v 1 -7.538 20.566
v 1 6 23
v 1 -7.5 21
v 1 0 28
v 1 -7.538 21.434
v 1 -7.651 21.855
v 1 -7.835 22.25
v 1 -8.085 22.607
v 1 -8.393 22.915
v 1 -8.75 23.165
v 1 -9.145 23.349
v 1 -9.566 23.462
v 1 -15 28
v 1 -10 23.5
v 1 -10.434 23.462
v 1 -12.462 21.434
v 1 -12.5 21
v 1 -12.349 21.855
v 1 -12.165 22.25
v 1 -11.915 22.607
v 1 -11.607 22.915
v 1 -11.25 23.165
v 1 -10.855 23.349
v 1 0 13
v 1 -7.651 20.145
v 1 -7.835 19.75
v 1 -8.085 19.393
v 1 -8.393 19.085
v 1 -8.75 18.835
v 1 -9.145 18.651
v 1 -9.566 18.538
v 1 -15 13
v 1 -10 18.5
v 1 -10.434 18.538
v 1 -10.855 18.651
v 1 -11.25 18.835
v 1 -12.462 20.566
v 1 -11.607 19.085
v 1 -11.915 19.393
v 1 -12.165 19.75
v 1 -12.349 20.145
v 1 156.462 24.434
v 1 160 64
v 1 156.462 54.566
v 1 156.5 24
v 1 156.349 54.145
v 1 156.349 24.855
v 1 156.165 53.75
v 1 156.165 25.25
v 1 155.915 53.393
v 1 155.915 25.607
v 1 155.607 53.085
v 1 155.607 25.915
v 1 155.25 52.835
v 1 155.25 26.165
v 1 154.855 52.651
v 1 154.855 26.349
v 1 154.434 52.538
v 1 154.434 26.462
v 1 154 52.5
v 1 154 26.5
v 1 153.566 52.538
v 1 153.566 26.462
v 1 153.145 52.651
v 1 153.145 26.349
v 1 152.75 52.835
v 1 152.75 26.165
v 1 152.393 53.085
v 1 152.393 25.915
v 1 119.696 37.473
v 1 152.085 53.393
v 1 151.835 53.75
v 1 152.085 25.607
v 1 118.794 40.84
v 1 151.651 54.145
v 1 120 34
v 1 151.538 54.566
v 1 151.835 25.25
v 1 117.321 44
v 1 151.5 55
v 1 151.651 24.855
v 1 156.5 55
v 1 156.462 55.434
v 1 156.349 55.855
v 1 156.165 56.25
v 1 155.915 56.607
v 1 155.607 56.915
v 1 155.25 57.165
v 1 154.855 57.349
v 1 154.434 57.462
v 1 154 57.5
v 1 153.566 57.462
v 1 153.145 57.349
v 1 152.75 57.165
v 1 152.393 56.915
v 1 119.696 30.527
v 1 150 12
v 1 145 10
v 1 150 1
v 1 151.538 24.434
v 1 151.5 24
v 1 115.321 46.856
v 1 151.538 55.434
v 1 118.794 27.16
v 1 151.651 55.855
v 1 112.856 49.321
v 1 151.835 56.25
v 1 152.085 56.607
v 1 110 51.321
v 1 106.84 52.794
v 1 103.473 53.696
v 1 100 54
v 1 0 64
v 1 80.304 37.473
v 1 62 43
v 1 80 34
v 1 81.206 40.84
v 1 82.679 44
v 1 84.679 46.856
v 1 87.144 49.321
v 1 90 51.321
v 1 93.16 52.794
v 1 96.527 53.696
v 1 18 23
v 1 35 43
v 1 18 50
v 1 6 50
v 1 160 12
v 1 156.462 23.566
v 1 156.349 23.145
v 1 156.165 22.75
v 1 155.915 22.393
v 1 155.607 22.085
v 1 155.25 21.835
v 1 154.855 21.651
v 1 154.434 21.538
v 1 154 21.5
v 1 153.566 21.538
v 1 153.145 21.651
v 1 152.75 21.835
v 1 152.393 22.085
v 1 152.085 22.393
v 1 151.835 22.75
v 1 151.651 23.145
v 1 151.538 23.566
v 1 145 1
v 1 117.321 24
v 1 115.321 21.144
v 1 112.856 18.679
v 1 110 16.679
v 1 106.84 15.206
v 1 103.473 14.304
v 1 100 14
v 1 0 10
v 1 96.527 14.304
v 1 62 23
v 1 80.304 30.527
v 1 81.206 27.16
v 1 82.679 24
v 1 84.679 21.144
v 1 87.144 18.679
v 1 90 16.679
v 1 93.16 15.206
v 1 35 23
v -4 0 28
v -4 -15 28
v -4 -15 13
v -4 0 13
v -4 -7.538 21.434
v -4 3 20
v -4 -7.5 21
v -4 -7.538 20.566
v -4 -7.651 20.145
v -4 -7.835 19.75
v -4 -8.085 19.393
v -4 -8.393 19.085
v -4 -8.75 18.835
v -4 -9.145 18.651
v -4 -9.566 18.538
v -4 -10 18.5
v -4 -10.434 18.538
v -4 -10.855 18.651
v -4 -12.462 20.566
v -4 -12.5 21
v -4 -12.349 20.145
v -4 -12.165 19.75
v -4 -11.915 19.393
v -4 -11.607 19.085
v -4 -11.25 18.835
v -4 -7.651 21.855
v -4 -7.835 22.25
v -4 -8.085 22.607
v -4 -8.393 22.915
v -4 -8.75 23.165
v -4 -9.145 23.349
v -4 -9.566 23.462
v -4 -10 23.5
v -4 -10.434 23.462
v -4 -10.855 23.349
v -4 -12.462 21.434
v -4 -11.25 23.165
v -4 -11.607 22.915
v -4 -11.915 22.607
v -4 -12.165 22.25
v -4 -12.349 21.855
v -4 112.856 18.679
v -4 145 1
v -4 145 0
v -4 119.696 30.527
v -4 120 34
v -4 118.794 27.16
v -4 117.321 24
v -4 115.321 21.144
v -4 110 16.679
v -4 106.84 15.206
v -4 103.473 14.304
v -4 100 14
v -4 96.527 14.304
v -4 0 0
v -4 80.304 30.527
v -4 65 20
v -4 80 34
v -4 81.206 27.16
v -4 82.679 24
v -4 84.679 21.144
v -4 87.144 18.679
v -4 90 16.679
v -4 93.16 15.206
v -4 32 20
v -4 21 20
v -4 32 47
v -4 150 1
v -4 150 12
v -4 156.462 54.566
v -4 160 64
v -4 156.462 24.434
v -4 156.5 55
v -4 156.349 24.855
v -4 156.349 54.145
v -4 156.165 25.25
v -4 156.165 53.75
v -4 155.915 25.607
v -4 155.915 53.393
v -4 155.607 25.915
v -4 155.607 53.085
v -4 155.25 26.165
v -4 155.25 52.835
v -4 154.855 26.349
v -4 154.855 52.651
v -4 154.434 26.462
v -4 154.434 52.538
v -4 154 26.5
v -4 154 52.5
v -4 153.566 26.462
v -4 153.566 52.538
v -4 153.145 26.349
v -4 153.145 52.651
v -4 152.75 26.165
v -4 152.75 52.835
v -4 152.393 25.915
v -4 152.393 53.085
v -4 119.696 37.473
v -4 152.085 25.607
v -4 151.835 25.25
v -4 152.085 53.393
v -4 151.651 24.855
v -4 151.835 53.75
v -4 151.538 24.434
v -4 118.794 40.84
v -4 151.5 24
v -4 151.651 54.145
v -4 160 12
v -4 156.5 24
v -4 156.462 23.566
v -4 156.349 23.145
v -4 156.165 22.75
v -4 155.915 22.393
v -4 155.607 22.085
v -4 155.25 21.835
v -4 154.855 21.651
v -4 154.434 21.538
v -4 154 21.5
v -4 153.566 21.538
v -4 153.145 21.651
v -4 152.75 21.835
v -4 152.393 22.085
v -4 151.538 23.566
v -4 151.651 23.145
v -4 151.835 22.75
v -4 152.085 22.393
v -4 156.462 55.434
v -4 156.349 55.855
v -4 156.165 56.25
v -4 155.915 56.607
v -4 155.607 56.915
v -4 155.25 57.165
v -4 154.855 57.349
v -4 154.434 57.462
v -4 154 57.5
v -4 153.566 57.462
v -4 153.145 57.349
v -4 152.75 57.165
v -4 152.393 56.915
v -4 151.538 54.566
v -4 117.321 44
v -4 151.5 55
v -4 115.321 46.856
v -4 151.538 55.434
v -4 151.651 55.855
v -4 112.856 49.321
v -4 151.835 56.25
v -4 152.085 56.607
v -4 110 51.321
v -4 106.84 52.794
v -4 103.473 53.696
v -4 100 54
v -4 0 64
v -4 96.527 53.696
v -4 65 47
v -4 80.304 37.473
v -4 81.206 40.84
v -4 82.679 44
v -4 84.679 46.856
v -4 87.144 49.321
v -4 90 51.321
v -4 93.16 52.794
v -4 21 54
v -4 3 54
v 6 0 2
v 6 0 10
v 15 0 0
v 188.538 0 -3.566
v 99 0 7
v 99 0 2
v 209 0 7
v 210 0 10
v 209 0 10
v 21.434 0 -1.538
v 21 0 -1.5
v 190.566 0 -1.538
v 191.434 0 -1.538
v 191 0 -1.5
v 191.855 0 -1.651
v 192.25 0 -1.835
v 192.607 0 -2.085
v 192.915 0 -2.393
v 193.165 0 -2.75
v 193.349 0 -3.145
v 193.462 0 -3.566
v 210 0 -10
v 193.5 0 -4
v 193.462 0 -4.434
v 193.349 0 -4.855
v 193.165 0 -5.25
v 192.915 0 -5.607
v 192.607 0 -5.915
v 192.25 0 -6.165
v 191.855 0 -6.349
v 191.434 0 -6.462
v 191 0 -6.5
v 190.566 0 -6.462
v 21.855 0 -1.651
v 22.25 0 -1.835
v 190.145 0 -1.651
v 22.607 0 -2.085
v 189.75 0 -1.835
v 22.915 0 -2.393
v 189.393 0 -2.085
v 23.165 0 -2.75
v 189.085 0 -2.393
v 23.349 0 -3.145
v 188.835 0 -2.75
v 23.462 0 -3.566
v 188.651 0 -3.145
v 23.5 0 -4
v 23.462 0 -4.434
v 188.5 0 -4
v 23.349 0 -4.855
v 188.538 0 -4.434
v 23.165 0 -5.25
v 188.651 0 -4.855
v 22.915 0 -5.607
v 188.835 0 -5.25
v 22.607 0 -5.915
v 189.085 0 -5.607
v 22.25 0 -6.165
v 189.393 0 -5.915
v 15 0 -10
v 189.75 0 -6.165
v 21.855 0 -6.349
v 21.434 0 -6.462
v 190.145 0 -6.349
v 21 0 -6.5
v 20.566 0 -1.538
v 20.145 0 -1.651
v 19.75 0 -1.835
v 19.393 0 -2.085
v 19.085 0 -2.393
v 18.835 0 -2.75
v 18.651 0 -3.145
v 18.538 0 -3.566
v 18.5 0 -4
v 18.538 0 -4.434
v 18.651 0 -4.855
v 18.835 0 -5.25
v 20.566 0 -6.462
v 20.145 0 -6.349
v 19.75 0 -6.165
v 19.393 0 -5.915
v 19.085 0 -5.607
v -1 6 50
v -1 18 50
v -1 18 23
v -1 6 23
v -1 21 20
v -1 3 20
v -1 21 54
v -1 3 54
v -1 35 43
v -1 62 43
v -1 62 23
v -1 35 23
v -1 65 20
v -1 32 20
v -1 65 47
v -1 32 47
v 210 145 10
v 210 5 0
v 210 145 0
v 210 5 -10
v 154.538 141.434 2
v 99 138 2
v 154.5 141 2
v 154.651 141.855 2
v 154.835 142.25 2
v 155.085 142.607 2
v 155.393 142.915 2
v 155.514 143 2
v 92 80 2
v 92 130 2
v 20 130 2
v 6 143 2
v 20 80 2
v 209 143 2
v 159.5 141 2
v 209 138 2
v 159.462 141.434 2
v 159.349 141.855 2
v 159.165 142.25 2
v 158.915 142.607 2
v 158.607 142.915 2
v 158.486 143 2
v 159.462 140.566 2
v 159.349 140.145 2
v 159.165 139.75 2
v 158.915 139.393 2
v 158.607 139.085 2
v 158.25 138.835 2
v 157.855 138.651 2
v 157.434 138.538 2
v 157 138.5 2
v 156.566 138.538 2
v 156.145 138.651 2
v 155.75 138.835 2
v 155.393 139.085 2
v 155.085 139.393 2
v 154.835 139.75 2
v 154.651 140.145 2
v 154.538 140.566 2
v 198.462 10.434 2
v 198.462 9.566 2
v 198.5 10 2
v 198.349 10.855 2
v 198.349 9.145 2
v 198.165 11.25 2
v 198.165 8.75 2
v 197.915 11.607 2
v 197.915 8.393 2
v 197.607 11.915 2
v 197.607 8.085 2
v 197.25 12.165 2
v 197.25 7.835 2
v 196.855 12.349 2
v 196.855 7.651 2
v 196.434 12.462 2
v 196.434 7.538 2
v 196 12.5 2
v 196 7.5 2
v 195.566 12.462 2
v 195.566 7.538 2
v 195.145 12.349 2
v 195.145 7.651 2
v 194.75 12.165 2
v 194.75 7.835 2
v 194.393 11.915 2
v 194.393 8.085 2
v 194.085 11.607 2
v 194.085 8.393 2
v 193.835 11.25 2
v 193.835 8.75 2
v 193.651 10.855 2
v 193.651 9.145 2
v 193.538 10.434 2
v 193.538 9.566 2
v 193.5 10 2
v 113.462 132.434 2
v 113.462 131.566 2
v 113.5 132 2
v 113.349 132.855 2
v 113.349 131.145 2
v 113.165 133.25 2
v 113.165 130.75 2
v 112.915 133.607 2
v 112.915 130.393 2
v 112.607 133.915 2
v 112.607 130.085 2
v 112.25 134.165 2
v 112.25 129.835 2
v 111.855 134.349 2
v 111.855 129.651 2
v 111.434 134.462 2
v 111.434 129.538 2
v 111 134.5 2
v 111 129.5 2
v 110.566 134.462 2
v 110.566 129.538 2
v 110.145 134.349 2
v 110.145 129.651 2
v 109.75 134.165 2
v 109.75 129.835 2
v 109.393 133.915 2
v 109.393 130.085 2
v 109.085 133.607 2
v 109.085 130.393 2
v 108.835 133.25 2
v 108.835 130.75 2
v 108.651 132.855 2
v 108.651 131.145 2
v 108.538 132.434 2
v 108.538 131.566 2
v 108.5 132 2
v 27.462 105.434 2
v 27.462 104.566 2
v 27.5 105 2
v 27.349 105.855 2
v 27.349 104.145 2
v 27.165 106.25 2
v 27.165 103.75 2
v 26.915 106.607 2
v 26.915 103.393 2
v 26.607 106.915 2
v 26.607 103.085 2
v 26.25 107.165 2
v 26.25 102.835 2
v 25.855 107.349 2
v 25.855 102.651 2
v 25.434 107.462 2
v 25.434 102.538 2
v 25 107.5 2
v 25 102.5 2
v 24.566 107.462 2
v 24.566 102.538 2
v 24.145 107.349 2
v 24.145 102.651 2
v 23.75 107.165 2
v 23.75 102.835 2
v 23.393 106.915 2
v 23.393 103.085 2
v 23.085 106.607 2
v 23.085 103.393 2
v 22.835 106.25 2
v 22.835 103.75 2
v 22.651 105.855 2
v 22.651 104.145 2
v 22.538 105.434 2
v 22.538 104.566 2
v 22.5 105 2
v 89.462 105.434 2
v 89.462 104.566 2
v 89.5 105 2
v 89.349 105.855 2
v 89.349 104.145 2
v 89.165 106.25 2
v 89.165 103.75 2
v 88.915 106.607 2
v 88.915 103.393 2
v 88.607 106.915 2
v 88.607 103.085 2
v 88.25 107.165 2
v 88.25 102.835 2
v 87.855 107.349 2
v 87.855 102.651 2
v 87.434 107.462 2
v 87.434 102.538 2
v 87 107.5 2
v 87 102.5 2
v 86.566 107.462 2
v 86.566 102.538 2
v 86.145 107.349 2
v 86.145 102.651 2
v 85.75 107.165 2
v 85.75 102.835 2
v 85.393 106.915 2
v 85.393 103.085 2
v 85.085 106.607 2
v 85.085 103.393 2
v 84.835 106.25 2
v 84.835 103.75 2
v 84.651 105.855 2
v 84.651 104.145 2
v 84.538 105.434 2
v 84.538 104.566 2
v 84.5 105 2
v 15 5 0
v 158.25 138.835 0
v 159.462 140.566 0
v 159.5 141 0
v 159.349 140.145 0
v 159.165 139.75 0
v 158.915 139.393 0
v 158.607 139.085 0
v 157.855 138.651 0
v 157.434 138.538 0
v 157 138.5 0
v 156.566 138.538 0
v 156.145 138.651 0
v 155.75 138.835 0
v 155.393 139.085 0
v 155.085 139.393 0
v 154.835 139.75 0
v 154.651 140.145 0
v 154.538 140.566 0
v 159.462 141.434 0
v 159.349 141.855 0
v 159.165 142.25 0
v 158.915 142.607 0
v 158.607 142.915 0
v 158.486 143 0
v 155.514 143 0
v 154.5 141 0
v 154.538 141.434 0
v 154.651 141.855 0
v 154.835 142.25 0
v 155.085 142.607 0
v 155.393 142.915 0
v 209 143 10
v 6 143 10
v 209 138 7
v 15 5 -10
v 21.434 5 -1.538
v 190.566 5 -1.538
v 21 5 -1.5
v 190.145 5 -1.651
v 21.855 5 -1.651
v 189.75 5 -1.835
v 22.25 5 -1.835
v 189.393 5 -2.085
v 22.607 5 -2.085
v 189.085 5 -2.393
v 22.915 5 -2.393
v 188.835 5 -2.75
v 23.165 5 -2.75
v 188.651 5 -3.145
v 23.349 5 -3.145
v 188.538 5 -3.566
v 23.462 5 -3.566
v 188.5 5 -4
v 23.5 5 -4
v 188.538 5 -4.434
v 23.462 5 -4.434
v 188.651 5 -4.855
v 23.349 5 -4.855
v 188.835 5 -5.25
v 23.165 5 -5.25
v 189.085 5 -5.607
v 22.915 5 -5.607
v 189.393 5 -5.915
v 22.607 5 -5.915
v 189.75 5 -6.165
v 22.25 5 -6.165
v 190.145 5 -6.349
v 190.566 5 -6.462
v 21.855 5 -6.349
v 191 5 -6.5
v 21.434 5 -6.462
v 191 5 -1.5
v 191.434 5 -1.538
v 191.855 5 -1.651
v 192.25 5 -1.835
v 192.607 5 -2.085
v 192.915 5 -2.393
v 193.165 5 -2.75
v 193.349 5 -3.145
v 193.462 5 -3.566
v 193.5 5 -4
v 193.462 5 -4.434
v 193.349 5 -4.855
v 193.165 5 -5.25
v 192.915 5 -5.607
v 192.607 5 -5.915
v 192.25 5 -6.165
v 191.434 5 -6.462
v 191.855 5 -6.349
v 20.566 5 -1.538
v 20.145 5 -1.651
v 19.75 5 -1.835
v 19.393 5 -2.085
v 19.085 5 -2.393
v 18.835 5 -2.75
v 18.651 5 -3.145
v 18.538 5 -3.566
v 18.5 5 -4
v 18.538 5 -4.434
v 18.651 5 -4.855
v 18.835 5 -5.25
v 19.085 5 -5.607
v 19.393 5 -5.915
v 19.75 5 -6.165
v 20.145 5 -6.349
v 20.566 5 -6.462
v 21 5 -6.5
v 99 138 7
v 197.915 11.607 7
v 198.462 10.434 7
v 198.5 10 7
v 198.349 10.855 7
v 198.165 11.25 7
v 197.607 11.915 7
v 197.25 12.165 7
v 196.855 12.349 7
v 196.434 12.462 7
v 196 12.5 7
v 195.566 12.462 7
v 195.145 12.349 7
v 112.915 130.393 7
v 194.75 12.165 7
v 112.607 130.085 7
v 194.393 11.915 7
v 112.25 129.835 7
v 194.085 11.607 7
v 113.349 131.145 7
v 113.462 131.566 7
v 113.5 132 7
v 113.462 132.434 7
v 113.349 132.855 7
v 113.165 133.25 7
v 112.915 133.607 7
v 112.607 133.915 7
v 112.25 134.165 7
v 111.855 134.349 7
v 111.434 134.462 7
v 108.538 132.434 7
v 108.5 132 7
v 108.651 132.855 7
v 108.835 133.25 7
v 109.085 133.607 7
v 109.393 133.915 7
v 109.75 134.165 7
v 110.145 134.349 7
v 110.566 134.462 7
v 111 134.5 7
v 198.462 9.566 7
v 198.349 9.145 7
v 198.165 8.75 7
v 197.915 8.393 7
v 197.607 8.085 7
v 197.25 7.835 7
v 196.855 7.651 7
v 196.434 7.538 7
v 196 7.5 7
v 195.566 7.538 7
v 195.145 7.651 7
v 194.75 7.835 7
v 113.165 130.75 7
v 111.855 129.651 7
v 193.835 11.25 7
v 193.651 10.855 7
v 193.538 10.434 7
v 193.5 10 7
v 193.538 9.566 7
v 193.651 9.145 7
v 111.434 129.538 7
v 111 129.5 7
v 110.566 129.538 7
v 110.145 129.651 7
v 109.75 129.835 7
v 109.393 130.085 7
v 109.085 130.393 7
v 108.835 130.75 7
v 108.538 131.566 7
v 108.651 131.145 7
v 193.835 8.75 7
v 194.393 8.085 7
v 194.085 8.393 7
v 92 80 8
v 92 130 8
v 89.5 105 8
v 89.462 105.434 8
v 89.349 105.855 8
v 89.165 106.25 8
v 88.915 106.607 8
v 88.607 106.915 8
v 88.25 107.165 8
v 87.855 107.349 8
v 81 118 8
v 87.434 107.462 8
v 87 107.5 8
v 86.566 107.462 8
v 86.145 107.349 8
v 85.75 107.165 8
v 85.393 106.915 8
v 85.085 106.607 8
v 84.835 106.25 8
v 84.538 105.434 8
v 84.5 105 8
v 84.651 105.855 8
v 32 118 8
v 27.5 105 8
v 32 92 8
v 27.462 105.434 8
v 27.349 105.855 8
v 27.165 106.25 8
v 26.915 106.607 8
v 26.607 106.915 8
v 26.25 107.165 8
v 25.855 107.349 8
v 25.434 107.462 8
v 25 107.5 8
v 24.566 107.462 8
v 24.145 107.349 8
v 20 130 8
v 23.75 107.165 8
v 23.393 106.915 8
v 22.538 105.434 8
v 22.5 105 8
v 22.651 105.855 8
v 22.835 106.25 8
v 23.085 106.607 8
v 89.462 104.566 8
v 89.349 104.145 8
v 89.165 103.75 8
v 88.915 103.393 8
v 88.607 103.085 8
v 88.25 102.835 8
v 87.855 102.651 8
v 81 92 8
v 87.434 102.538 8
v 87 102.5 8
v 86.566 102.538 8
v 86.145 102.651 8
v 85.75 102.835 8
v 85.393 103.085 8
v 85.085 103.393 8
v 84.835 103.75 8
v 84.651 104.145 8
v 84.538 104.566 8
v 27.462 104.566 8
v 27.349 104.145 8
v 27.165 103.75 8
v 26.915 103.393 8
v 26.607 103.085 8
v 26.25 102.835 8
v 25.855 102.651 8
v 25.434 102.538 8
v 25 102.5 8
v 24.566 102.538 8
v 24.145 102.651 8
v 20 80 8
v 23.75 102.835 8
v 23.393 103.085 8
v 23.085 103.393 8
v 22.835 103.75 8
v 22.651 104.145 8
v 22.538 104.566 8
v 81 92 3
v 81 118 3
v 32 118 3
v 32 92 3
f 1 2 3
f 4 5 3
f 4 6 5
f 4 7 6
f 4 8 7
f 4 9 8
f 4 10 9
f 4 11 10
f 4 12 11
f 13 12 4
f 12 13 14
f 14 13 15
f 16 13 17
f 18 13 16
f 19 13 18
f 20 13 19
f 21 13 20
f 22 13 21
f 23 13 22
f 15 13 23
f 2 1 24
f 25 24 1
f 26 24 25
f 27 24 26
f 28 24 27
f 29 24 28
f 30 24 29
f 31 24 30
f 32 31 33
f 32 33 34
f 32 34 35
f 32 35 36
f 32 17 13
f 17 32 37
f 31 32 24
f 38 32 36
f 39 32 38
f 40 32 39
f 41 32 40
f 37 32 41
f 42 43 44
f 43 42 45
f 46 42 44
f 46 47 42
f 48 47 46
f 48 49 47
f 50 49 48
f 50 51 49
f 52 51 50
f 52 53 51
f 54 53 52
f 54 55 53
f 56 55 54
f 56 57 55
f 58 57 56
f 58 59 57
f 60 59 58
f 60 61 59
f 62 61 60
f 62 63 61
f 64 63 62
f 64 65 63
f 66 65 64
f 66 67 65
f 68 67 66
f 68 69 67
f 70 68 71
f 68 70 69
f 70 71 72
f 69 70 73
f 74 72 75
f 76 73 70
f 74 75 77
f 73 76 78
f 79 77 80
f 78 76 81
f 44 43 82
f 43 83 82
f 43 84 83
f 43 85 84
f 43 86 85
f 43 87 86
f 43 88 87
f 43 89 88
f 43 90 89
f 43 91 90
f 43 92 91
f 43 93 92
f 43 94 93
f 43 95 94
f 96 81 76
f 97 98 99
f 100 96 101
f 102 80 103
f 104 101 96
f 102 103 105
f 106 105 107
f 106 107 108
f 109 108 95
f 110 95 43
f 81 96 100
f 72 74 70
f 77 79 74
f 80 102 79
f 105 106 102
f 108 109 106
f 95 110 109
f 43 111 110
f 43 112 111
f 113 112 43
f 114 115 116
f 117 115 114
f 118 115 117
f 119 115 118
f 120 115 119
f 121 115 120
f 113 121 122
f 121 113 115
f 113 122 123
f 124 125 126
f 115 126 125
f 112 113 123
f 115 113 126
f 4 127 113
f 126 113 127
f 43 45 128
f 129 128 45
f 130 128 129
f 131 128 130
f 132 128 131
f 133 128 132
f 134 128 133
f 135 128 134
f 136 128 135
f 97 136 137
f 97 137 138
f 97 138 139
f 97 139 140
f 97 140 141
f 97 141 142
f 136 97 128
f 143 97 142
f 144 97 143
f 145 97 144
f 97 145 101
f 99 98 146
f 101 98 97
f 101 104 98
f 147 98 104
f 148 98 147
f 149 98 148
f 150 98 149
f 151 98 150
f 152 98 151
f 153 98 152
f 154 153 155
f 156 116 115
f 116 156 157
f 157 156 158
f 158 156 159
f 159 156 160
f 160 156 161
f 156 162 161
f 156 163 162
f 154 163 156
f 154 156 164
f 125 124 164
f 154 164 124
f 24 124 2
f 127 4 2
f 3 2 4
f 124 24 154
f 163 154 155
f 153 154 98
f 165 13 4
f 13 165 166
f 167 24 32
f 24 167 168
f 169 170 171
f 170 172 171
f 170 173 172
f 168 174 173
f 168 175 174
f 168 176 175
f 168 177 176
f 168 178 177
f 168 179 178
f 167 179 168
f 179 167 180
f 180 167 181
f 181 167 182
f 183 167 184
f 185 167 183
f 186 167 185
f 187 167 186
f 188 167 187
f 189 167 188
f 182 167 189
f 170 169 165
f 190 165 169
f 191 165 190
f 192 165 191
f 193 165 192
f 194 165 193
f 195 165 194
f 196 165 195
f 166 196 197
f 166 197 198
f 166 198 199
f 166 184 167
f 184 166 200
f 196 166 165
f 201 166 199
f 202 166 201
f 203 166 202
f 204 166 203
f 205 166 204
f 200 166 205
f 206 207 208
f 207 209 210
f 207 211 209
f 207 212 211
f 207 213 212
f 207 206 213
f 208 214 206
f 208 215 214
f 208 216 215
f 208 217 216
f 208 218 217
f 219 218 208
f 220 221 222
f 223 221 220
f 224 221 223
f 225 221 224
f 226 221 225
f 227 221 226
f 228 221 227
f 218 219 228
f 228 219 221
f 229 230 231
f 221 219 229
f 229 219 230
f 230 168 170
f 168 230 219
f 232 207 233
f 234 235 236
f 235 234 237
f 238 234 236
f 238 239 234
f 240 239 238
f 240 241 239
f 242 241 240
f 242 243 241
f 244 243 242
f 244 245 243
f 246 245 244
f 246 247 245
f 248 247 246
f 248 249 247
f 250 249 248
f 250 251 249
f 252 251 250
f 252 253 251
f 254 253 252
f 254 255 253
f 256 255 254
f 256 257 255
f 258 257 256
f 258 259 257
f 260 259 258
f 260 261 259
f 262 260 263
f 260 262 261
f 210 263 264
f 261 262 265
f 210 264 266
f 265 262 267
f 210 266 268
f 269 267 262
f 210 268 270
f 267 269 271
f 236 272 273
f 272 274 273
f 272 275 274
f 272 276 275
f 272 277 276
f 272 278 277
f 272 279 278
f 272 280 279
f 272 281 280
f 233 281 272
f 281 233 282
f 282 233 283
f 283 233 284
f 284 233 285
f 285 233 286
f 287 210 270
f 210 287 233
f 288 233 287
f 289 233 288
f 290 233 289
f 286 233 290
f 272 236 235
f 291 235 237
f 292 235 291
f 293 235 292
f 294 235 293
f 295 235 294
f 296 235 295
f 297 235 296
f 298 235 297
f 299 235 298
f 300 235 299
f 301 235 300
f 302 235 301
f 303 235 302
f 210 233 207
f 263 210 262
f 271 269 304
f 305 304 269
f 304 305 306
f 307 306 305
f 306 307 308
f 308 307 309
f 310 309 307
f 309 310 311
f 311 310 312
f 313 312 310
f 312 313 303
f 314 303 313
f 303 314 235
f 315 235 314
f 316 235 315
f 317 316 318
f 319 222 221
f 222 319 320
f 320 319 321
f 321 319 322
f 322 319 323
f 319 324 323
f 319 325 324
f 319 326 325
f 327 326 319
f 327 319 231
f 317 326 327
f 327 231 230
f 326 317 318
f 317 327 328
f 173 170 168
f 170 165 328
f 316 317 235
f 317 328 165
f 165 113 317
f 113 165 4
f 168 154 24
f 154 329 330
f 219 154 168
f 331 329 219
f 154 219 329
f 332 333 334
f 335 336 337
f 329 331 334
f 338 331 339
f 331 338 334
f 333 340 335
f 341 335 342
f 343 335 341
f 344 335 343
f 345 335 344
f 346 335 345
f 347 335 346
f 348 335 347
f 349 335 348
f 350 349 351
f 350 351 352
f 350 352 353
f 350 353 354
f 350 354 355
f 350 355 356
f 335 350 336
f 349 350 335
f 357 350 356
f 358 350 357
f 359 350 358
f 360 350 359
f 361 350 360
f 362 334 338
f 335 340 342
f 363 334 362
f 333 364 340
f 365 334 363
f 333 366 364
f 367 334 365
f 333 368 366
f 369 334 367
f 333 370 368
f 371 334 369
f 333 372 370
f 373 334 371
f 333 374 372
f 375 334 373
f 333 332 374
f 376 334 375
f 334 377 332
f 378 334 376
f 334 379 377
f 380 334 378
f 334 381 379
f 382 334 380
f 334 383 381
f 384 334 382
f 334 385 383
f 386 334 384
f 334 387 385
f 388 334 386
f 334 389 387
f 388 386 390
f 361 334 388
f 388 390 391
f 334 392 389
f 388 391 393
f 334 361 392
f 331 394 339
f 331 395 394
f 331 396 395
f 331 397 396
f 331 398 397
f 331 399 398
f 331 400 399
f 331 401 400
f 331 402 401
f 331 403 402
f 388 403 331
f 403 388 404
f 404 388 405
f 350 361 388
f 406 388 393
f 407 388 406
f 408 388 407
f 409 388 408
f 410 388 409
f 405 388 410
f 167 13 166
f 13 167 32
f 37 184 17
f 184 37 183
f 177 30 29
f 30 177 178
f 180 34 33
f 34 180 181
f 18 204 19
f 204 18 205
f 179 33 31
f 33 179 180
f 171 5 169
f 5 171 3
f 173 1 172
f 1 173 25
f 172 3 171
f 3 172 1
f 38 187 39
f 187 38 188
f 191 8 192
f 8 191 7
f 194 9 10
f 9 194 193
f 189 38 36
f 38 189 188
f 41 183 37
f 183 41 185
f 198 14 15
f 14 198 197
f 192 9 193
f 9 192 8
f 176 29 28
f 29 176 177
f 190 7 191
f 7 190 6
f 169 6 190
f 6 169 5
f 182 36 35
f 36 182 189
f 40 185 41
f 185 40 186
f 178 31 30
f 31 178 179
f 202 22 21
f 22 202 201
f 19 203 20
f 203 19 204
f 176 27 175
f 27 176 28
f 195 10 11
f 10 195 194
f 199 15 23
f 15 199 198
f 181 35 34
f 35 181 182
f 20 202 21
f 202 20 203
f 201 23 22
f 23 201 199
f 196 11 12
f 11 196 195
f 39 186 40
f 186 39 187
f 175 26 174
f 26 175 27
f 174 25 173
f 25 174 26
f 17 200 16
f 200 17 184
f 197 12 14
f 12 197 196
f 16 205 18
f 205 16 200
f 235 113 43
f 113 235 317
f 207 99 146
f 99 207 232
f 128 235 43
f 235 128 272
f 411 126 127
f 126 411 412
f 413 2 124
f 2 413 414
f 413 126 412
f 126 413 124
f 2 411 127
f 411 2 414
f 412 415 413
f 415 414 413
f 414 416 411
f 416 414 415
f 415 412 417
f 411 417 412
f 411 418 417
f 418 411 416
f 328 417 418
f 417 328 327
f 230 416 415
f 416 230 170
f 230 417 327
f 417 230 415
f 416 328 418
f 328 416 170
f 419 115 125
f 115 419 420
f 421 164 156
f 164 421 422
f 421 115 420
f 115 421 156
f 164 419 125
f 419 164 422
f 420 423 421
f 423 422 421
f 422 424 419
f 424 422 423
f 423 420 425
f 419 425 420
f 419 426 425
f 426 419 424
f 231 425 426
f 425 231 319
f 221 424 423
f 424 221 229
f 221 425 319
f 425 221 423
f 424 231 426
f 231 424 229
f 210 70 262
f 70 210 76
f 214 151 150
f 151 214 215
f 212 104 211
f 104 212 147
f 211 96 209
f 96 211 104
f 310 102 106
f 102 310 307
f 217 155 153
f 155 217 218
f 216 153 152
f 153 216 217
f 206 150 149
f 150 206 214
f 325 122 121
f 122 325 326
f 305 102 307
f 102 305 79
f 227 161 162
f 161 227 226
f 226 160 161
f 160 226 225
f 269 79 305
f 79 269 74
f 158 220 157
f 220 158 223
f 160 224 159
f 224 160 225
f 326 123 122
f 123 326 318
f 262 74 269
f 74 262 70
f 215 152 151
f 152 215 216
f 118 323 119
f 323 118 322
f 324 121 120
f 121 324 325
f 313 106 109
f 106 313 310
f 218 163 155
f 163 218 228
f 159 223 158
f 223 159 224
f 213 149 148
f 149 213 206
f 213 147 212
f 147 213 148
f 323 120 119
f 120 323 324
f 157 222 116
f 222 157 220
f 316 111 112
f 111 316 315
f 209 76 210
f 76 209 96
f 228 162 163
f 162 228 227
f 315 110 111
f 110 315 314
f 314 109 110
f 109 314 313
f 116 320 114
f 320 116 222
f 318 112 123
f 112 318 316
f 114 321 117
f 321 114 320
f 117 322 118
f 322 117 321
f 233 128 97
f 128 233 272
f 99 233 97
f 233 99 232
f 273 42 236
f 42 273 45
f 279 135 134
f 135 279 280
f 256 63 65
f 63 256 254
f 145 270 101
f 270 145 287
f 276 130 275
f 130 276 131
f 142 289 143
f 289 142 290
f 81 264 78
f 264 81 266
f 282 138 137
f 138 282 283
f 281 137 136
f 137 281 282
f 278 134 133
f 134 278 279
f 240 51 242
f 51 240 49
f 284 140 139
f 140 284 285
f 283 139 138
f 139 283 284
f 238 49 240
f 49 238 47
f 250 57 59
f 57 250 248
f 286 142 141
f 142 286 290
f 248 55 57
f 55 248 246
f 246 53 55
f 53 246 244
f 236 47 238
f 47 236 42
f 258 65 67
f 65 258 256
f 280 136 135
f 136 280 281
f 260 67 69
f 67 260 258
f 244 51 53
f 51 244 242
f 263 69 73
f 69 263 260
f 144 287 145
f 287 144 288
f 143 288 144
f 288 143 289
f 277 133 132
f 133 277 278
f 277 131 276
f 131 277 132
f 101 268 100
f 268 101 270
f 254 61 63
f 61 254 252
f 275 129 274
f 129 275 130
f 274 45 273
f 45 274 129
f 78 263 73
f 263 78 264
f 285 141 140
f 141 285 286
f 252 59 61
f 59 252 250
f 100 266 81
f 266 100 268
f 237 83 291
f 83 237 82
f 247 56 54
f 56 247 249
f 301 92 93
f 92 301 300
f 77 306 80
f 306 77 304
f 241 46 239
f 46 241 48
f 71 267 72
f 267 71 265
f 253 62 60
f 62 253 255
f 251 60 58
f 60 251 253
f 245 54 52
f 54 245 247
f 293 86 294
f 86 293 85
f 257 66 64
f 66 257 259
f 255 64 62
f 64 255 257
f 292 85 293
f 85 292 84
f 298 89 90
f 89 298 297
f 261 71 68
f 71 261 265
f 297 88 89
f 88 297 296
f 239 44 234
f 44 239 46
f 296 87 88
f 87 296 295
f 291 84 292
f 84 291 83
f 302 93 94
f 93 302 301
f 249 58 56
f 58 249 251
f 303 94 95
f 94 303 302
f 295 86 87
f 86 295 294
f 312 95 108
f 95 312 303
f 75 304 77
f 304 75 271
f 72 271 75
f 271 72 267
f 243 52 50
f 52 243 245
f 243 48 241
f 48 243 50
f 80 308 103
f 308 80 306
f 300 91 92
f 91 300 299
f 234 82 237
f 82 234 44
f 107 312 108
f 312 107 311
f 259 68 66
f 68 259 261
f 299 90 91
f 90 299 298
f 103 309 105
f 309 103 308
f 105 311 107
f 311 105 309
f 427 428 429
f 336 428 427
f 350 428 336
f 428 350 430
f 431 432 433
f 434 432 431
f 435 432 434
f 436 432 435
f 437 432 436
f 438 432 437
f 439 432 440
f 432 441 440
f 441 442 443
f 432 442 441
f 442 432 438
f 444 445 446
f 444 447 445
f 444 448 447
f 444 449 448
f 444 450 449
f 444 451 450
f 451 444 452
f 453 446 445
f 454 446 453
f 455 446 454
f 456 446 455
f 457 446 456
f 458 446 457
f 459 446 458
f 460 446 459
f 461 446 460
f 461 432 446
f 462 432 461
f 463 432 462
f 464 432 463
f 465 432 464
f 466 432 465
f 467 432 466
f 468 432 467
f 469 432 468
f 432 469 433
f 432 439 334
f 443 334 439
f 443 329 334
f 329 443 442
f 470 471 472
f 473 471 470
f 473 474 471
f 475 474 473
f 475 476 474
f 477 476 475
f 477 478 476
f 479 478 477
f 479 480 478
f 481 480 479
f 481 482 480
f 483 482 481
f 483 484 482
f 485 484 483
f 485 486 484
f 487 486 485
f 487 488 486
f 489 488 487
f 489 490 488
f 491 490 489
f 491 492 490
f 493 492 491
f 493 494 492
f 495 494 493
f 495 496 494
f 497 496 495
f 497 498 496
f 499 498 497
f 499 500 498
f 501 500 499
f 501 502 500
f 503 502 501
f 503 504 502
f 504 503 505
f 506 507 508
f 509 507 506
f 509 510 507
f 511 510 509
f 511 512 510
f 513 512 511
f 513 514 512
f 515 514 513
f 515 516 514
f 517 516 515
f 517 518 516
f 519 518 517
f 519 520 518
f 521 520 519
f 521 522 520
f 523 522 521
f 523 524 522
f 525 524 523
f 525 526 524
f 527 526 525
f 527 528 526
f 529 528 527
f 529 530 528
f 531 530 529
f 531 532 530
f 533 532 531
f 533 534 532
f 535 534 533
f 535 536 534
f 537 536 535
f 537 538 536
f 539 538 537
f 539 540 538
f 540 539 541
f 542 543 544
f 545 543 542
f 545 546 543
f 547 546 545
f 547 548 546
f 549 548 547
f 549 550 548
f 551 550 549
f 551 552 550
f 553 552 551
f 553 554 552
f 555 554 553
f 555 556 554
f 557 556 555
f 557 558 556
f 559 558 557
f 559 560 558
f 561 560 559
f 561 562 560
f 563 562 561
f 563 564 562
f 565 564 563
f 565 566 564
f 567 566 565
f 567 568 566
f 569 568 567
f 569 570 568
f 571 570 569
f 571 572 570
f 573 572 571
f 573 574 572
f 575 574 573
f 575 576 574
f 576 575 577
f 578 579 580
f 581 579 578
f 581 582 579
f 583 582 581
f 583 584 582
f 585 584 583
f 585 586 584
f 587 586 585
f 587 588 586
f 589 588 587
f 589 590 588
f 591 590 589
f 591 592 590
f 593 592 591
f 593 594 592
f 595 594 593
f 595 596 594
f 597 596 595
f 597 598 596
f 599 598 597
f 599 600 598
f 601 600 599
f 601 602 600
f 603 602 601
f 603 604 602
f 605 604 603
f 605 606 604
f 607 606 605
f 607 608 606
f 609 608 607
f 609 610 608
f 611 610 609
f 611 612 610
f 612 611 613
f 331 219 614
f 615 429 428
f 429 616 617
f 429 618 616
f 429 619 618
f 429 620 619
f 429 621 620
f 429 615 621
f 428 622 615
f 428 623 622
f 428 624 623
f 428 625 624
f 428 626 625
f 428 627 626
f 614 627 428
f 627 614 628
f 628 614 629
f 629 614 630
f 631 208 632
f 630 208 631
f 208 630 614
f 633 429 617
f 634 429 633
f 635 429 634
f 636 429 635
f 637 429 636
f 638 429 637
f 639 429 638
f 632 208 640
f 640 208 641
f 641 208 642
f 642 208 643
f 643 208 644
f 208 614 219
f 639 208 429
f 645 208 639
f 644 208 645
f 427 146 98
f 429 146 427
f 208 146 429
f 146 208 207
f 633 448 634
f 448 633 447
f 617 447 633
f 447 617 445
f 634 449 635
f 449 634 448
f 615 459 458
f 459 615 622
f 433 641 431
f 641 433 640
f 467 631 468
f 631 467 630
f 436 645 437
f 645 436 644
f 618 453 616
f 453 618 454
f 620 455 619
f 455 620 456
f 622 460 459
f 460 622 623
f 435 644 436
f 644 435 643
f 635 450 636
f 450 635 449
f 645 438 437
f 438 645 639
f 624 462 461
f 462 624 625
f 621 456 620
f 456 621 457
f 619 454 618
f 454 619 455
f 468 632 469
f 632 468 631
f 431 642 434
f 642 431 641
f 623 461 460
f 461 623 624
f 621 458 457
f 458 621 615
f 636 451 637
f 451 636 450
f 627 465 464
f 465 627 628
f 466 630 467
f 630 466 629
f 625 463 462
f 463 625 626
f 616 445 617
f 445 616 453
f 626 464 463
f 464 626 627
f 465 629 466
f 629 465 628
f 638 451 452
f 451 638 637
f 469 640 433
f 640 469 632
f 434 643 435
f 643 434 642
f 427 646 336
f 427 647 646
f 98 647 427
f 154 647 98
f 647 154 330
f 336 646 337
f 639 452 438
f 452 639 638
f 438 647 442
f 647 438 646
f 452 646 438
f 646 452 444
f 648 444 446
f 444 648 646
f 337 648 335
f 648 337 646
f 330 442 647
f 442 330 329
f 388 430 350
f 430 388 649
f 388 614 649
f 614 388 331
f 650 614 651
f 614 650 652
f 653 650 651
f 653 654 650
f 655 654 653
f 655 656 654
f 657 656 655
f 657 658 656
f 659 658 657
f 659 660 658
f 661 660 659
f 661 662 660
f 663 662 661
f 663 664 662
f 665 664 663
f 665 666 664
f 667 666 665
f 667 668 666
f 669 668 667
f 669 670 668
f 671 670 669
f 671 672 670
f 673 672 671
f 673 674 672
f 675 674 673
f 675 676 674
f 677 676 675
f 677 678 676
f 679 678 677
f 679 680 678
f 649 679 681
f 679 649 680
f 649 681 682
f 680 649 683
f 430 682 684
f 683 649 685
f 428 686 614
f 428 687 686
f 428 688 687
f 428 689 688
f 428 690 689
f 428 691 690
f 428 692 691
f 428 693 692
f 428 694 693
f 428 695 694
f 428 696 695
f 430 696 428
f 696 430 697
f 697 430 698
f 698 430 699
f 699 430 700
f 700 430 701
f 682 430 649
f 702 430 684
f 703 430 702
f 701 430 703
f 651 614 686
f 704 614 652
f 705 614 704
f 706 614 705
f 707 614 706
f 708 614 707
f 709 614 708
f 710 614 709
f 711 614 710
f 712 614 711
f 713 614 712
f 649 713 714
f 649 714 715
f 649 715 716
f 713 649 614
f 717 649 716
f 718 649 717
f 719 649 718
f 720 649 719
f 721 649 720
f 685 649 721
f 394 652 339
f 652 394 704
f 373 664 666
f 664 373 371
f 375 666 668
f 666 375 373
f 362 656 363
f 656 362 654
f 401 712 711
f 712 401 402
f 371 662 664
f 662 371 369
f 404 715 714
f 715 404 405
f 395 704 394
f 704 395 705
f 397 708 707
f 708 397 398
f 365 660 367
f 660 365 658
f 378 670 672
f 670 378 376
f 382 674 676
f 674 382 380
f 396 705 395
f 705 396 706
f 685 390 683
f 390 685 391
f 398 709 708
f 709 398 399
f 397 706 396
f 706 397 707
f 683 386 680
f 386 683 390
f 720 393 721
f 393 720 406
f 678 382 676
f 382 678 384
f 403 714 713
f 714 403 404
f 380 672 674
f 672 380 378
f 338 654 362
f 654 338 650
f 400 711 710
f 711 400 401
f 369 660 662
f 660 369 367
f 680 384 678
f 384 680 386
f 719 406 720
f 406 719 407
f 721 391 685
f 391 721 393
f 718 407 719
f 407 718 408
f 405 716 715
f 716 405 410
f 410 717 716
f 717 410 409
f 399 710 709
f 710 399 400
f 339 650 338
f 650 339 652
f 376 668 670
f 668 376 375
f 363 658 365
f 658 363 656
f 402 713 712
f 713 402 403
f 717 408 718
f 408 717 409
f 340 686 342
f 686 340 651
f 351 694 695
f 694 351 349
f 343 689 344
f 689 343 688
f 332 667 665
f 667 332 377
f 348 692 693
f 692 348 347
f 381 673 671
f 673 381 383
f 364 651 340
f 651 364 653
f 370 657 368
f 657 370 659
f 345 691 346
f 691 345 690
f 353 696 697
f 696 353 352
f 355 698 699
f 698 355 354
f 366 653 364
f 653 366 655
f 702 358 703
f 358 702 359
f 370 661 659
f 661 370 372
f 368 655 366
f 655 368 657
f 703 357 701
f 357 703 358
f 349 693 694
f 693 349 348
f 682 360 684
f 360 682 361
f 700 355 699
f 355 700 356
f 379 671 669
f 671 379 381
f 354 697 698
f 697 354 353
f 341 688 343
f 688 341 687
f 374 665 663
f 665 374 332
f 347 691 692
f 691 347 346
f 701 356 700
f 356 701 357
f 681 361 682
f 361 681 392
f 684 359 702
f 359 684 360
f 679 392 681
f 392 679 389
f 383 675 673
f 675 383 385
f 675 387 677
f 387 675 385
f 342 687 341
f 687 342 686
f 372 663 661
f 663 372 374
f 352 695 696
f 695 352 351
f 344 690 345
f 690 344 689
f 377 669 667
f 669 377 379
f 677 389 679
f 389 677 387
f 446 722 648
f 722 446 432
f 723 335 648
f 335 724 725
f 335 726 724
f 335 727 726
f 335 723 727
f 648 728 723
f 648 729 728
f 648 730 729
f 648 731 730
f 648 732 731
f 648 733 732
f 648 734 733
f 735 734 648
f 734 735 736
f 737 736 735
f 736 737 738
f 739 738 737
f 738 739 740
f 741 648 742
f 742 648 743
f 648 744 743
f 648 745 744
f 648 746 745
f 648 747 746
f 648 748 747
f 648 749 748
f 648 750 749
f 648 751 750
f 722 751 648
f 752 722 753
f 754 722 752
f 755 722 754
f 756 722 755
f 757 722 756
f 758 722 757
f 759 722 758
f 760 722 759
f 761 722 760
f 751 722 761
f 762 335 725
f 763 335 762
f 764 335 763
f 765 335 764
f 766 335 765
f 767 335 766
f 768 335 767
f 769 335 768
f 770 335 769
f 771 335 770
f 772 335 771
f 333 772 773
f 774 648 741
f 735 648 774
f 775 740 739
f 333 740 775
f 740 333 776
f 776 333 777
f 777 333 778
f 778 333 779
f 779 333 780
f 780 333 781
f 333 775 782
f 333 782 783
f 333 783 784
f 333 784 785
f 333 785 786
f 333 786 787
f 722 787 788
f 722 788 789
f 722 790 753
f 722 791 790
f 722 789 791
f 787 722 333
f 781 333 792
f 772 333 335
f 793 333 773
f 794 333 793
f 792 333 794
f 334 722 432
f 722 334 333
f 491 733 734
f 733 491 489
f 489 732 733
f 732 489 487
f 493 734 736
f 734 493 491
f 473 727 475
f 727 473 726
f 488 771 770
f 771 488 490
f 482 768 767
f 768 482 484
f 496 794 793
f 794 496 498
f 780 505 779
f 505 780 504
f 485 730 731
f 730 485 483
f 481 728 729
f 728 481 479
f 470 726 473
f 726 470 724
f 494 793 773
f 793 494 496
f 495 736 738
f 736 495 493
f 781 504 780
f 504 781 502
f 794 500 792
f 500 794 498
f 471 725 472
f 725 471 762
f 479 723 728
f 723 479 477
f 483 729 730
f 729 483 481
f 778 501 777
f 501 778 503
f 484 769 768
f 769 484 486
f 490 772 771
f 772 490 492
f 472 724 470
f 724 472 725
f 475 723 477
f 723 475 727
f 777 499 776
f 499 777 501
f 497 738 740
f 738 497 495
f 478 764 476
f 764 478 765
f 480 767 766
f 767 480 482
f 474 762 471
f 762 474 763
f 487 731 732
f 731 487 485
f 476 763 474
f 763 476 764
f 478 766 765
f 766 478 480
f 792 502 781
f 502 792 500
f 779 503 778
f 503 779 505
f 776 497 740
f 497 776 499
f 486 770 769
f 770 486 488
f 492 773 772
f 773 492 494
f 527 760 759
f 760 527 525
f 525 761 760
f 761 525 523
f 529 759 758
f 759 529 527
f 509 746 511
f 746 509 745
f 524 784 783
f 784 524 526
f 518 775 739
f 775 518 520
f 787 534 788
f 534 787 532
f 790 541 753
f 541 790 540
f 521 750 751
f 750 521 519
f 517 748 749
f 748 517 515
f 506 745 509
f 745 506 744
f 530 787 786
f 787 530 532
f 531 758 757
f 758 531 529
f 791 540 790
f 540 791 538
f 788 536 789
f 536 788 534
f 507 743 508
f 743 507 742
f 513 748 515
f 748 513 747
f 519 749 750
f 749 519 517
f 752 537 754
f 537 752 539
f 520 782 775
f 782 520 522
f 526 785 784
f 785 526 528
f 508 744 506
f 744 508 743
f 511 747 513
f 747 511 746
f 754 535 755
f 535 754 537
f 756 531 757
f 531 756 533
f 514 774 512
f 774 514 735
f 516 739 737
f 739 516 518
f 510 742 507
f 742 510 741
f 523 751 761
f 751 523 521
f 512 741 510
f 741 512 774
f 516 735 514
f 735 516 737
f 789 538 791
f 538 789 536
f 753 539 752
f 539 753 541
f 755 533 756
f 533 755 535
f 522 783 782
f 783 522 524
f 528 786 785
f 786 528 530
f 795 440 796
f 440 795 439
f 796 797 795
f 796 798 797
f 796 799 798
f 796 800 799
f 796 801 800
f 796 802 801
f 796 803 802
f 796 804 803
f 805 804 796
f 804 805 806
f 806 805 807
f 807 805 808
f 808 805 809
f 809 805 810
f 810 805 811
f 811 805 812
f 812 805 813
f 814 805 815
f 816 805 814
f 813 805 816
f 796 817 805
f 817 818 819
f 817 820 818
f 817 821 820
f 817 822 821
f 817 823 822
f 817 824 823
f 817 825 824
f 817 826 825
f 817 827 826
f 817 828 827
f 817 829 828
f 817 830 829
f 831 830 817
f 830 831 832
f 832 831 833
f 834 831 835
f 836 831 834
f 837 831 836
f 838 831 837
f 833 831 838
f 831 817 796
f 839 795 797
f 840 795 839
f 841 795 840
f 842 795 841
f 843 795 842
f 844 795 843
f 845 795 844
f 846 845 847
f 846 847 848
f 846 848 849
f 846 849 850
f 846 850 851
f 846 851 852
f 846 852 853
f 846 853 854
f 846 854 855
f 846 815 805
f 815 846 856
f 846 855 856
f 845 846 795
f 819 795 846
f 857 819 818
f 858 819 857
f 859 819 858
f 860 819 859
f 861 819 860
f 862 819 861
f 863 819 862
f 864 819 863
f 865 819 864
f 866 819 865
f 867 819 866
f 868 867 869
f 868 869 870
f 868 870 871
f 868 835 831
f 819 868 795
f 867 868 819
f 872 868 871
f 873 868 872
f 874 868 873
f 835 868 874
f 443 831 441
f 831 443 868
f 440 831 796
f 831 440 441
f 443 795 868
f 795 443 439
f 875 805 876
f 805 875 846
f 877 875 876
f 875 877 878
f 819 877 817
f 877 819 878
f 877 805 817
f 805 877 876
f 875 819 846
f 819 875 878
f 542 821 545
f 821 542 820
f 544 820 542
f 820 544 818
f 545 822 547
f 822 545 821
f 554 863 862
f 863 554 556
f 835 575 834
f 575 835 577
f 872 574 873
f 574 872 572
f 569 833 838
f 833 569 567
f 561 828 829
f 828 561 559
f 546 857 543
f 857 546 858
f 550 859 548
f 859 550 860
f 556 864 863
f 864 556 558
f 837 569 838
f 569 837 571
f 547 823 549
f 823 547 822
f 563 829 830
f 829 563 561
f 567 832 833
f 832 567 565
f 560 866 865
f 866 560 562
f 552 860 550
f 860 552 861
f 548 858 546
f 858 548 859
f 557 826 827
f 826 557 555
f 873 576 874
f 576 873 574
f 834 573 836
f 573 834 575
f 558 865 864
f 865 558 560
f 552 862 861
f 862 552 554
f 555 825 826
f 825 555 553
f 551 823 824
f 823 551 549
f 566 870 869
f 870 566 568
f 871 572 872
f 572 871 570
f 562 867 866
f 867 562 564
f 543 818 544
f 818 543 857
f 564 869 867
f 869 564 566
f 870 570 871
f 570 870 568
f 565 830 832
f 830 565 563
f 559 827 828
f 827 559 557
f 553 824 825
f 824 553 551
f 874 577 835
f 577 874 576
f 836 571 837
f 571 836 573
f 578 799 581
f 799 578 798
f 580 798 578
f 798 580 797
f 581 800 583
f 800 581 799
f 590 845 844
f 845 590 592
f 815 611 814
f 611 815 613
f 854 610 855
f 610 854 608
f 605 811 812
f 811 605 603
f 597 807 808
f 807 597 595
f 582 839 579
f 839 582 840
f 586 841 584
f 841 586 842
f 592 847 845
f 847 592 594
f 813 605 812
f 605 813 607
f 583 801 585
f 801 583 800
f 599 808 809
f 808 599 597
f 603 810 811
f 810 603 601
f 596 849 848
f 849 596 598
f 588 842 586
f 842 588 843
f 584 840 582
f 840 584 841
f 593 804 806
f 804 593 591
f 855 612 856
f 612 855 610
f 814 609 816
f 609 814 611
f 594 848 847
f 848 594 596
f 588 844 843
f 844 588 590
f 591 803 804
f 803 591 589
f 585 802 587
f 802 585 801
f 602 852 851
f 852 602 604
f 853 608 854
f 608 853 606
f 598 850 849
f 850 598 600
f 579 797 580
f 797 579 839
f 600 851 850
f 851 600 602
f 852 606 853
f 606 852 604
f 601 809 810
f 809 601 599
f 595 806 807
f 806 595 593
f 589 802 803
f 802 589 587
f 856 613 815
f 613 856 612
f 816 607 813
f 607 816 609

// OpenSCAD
$fn=36;

translate([0,0,1]) rueckwand();
baseplate();
translate([15,0,-10]) leiste();

rotate([0,0,90]) translate([0,-209,2]) dc_podest();
translate([20,80,2]) coil_holder();

module dc_podest() {
	difference() {
    cube([138,110,5],center=false); //DC-podest
	  translate([10,13,-1]) cylinder(h=7,d=5,center=false);
	  translate([132,98,-1]) cylinder(h=7,d=5,center=false);
  }
}

module baseplate() {
	difference() {
  	translate ([-4,0,0]) cube([214,145,2],center=false); //bodenplatte
    translate([157,141,-1]) cylinder(h=7,d=5,center=false);
	}
	translate([1,143,0])  cube([209,2,10],center=false); //seitenwand
	translate([209,0,0]) cube([1,145,10],center=false); //vorderwand
	translate([1,0,0]) cube([5,144,10],center=false); //stabilisator
}

module coil_holder() {
  difference() {
	  cube([72,50,6],center=false);
    translate([12,12,1]) cube([49,26,7],center=false);
		translate([5,25,0]) cylinder(h=7,d=5,center=false);
		translate([67,25,0]) cylinder(h=7,d=5,center=false);
	}
}

module rueckwand() {
//  translate([1,0,0]) cube([10,1,60],center=false);
//  translate([1,1,0]) cube([5,2,60],center=false);
  difference() {
	  translate([-4,-15,12]) cube([5,15,15],center=false);
	  translate([-5,-10,20]) rotate([0,90,0]) cylinder(h=7,d=5,center=false);
  }

  difference() {
		translate([-4,0,0]) cube([5,160,63],center=false);
		
		translate([-5,6,22]) cube([7,12,27],center=false);
		translate([-6,3,19]) cube([5,18,34],center=false);

		translate([-5,35,22]) cube([7,27,20],center=false);
		translate([-6,32,19]) cube([5,33,27],center=false);

		translate([-5,100,33]) rotate([0,90,0]) cylinder(h=7,d=40,center=false);		
		translate([-5,150,-1]) cube([7,11,12],center=false);
		
		translate([-5,154,23]) rotate([0,90,0]) cylinder(h=7,d=5,center=false);
    translate([-5,154,54]) rotate([0,90,0]) cylinder(h=7,d=5,center=false);
  }
}

module leiste() {
	difference() {
		cube([195,5,10]);
		translate([6,6,6]) rotate([90,0,0]) cylinder(h=7,d=5,center=false);
		translate([176,6,6]) rotate([90,0,0]) cylinder(h=7,d=5,center=false);
	}

}
